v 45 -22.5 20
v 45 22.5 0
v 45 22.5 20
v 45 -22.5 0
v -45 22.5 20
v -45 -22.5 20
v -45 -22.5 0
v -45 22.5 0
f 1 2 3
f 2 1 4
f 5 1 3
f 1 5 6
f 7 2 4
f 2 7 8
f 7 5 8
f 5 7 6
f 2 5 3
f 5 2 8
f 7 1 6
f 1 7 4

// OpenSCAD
// Built by bench/smallmodels/features/compiler.py from a list of features.
$fn = 64;
difference() {
  union() {
    translate([0, 0, 0]) translate([-45, -22.5, 0]) cube([90, 45, 20]);
  }
  union() {
    translate([0, -35.5, 9.99]) rotate([0, 0, 0]) hull() { for (s = [-1, 1]) translate([s * 37.7, 0, 0]) cylinder(d = 1.6, h = 10.02); }
  }
}
difference() {
  union() {
    translate([0, 0, 0]) translate([-45, -22.5, 0]) cube([90, 45, 20]);
  }
  union() {
    translate([0, 3.5, 9.99]) rotate([0, 0, 0]) hull() { for (s = [-1, 1]) translate([s * 37.7, 0, 0]) cylinder(d = 1.6, h = 10.02); }
  }
}
difference() {
  union() {
    translate([0, 0, 0]) translate([-45, -22.5, 0]) cube([90, 45, 20]);
  }
  union() {
    translate([0, -10.5, 9.99]) rotate([0, 0, 0]) hull() { for (s = [-1, 1]) translate([s * 37.7, 0, 0]) cylinder(d = 1.6, h = 10.02); }
  }
}
difference() {
  union() {
    translate([0, 0, 0]) translate([-45, -22.5, 0]) cube([90, 45, 20]);
  }
  union() {
    translate([0, 7, 9.99]) rotate([0, 0, 0]) hull() { for (s = [-1, 1]) translate([s * 37.7, 0, 0]) cylinder(d = 1.6, h = 10.02); }
  }
}
difference() {
  union() {
    translate([0, 0, 0]) translate([-45, -22.5, 0]) cube([90, 45, 20]);
  }
  union() {
    translate([0, -17.5, 9.99]) rotate([0, 0, 0]) hull() { for (s = [-1, 1]) translate([s * 37.7, 0, 0]) cylinder(d = 1.6, h = 10.02); }
  }
}
difference() {
  union() {
    translate([0, 0, 0]) translate([-45, -22.5, 0]) cube([90, 45, 20]);
  }
  union() {
    translate([0, -24.5, 9.99]) rotate([0, 0, 0]) hull() { for (s = [-1, 1]) translate([s * 37.7, 0, 0]) cylinder(d = 1.6, h = 10.02); }
  }
}
difference() {
  union() {
    translate([0, 0, 0]) translate([-45, -22.5, 0]) cube([90, 45, 20]);
  }
  union() {
    translate([0, -31.5, 9.99]) rotate([0, 0, 0]) hull() { for (s = [-1, 1]) translate([s * 37.7, 0, 0]) cylinder(d = 1.6, h = 10.02); }
  }
}
difference() {
  union() {
    translate([0, 0, 0]) translate([-45, -22.5, 0]) cube([90, 45, 20]);
  }
  union() {
    translate([0, -38.5, 9.99]) rotate([0, 0, 0]) hull() { for (s = [-1, 1]) translate([s * 37.7, 0, 0]) cylinder(d = 1.6, h = 10.02); }
  }
}
